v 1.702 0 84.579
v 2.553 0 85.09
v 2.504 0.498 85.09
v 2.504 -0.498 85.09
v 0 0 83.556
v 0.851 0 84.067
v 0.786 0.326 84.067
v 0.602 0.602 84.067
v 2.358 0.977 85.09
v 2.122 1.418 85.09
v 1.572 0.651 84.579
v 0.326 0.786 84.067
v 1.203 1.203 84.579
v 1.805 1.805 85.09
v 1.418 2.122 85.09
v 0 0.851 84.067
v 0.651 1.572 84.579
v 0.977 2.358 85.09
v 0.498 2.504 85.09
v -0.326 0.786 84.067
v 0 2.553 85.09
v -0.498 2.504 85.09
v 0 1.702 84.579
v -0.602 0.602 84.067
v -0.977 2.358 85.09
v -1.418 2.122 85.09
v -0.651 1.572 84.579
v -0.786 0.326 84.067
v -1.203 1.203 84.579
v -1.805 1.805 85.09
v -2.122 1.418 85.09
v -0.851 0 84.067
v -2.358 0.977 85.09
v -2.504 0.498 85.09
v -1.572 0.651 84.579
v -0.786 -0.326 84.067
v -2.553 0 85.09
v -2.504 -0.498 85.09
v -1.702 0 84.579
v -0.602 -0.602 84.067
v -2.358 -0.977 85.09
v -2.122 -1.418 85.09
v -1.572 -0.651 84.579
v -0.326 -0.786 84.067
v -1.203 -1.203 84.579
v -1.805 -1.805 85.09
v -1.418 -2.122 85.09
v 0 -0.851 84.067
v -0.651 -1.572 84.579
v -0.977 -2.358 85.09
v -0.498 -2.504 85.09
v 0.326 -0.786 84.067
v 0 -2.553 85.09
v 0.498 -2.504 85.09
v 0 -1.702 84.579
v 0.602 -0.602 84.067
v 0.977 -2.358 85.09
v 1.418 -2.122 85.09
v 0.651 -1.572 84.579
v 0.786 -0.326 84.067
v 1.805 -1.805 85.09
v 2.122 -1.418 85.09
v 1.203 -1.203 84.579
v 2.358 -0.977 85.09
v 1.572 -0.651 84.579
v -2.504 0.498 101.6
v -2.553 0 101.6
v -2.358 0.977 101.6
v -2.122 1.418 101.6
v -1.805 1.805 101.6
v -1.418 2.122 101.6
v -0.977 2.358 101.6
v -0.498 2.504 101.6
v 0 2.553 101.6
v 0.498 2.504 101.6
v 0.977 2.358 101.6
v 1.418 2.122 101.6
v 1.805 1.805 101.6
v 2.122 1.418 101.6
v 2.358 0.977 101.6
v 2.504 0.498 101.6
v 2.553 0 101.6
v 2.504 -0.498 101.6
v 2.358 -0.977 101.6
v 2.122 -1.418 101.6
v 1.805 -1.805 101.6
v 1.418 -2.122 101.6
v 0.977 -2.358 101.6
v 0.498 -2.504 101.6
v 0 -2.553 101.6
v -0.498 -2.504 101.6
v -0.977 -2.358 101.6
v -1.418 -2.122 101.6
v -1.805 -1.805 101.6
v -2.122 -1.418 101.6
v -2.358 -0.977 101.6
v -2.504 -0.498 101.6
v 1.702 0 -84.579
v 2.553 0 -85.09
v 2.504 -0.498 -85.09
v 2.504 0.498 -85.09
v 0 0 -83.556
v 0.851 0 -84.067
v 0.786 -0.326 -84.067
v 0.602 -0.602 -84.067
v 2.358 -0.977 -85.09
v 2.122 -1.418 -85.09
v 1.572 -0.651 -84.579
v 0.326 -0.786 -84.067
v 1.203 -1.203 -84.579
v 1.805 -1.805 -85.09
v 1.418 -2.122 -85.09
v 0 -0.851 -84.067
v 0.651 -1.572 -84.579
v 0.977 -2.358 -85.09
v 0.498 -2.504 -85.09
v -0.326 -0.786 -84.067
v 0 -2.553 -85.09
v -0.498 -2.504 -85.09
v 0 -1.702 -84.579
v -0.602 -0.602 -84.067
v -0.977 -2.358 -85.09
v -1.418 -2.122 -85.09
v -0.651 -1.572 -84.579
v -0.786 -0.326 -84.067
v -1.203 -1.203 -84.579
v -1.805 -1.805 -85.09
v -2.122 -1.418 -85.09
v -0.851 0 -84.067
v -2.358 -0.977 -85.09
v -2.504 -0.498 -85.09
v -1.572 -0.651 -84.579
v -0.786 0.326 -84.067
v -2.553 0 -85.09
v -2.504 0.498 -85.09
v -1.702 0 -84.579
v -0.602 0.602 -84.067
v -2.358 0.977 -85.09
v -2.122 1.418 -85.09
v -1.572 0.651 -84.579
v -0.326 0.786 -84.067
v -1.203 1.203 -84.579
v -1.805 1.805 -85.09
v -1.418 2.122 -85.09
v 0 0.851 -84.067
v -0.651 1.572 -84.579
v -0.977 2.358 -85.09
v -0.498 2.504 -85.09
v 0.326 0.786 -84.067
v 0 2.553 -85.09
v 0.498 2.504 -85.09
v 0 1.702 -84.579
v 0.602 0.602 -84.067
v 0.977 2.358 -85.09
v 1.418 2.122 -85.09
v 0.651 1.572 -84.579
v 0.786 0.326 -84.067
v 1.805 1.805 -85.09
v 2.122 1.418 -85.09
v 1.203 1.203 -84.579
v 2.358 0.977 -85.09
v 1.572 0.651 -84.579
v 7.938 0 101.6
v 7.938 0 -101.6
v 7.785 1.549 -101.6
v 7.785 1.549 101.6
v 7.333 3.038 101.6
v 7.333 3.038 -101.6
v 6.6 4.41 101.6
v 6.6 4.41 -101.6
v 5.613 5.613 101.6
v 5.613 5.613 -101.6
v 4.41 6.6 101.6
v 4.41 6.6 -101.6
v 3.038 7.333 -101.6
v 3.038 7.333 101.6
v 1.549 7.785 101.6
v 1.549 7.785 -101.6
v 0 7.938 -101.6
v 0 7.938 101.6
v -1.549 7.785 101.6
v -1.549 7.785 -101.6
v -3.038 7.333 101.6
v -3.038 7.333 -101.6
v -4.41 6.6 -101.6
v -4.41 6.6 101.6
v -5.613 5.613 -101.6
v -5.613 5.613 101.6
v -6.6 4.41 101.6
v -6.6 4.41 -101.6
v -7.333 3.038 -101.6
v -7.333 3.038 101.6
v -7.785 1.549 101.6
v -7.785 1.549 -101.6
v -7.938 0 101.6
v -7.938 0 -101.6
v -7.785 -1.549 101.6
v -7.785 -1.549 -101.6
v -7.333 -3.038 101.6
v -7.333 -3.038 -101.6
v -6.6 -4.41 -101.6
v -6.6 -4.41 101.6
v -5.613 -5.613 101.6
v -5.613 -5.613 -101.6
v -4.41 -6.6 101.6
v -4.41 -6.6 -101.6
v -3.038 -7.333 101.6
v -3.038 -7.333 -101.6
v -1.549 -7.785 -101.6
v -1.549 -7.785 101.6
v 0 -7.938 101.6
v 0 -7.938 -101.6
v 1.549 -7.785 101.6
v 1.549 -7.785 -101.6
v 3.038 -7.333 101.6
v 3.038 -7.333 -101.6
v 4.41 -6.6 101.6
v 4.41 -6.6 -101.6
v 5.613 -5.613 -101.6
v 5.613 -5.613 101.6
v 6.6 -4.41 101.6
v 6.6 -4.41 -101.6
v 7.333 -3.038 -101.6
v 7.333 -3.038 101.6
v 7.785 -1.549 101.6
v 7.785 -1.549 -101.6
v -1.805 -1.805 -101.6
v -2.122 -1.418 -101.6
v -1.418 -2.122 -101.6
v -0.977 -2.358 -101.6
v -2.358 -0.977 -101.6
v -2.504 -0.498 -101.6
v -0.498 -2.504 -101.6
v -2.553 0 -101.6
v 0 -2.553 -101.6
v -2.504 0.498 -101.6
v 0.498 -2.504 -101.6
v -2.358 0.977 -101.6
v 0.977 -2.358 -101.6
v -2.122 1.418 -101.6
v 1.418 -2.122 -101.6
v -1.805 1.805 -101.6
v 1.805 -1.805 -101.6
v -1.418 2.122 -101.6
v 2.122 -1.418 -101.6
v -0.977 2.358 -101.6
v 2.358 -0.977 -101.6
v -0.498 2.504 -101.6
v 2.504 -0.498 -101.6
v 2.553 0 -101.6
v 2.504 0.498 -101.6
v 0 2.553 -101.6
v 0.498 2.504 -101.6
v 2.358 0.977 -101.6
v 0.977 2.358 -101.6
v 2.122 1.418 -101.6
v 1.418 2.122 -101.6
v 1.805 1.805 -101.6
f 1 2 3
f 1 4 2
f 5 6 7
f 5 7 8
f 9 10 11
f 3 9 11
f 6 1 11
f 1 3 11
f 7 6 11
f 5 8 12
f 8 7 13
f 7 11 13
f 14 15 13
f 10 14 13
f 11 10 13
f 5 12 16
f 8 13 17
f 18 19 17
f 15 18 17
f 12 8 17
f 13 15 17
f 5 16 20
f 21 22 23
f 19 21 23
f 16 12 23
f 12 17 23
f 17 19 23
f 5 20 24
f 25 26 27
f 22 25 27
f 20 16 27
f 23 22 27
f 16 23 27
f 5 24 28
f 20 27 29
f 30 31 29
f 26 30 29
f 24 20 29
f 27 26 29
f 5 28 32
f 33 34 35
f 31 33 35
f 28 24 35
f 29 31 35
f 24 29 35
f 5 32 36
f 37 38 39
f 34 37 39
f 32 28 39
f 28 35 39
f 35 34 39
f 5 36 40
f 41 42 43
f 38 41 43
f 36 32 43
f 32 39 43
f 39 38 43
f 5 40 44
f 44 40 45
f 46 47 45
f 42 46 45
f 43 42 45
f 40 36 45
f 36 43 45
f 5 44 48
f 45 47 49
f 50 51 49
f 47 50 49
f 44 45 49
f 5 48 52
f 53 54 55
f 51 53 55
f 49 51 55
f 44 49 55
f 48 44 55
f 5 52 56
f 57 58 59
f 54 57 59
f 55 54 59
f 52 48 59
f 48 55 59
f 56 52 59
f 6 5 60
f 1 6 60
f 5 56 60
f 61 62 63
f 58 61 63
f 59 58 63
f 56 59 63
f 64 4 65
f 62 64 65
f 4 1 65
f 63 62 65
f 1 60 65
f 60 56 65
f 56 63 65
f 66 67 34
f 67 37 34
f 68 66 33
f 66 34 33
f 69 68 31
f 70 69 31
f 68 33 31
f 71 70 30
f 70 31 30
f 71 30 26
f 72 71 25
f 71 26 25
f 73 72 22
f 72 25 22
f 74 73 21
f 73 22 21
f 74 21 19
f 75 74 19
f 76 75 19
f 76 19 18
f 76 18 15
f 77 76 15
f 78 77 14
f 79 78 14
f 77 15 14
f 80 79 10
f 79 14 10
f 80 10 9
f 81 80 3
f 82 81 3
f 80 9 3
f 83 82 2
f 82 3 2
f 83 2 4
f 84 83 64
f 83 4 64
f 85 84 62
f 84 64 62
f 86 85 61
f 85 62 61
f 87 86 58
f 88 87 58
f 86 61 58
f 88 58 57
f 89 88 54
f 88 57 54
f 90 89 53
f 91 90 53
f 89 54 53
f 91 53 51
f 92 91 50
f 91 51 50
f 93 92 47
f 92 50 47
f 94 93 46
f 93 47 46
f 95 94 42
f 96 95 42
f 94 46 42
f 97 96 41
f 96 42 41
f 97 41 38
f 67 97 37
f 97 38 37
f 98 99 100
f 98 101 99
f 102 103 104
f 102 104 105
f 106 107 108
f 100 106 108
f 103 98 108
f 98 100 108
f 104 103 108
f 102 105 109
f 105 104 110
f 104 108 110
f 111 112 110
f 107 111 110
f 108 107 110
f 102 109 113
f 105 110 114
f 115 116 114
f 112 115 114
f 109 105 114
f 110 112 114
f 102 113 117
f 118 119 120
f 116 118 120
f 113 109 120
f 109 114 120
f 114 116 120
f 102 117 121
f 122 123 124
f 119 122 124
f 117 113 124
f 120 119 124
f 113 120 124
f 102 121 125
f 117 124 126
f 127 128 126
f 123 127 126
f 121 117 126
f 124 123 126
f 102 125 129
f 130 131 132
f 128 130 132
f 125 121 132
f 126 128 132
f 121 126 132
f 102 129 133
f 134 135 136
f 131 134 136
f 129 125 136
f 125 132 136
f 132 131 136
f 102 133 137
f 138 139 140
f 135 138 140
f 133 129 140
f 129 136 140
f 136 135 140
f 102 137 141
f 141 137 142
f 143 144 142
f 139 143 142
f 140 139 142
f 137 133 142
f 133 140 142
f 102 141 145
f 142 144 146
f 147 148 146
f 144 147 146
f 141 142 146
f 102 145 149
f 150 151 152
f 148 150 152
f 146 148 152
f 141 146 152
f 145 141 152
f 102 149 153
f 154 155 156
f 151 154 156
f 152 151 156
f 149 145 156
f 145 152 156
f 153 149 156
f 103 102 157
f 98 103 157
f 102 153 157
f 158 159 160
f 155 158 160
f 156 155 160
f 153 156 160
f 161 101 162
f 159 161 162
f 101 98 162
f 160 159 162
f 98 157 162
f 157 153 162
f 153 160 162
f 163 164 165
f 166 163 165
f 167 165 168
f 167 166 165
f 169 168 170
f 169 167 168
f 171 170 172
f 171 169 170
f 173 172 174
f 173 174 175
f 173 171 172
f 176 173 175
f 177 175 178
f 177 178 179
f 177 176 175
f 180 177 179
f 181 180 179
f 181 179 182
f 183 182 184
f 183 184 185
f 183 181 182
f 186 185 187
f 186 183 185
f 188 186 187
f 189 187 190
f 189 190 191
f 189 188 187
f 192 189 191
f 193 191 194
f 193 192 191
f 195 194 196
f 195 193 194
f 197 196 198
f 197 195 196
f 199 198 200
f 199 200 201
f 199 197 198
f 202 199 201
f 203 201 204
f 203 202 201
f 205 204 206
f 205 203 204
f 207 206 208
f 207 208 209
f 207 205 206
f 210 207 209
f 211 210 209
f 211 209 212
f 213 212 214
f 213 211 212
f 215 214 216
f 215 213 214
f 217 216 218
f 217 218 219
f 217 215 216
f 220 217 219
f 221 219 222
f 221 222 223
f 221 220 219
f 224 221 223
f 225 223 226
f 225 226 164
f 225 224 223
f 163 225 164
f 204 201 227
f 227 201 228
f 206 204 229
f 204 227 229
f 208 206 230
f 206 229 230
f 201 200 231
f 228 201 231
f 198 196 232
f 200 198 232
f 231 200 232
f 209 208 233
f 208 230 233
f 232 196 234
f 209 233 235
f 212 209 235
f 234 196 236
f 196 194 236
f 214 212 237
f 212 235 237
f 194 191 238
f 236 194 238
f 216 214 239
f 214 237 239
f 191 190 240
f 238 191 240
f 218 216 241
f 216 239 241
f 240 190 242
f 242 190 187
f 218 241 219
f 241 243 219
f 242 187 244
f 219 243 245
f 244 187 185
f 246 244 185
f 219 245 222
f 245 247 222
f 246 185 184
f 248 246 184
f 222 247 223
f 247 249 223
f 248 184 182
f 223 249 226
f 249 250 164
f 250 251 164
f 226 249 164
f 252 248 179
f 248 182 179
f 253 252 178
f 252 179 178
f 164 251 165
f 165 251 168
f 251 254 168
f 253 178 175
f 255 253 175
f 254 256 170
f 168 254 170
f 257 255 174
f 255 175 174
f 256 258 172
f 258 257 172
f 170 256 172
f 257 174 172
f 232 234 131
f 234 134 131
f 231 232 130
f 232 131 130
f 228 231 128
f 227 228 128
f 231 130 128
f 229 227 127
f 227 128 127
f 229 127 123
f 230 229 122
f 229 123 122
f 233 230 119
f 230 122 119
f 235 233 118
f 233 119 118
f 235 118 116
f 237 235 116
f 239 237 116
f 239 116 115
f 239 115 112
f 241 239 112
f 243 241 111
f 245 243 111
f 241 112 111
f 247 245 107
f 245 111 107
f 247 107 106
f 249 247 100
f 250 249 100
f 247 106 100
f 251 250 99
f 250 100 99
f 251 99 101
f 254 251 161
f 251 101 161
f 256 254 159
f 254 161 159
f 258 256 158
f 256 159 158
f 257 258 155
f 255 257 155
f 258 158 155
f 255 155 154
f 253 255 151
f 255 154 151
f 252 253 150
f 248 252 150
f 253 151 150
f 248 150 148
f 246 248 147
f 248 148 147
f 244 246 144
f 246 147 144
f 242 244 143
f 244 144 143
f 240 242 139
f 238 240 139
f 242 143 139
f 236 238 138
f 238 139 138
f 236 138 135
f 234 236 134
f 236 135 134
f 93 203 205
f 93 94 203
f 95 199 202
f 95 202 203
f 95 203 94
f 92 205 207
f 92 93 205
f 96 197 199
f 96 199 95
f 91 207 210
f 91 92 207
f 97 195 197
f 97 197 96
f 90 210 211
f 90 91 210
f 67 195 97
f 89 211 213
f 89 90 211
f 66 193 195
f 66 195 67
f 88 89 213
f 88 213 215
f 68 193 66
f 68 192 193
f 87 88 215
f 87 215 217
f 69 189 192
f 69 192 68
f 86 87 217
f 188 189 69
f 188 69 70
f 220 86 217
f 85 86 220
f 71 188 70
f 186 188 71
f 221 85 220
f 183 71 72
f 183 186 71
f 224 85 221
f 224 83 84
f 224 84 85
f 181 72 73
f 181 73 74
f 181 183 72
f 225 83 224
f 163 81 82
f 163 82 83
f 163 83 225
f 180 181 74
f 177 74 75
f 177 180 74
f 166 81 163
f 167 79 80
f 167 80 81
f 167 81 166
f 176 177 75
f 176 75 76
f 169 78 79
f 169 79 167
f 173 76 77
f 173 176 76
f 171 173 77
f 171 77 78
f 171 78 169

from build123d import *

# Parameters (mm, degrees)
F0_R     = 7.9375
F1_DEPTH = 101.6
F3_D     = 5.1054
F3_DEPTH = 16.51
F3_TIP   = 1.5338169022
F5_D     = 5.1054
F5_DEPTH = 16.51
F5_TIP   = 1.5338169022


with BuildPart() as f1:
    # F0 (on Top) → F1 (new body, symmetric)
    with BuildSketch(Plane.XY):
        Circle(F0_R)
    extrude(amount=F1_DEPTH, both=True)

    # F3
    with Locations(Plane.XY.offset(101.6)):
        with Locations((0, 0)):
            Hole(F3_D / 2, depth=F3_DEPTH)
            with Locations((0, 0, -(F3_DEPTH + F3_TIP / 2))):  # 118° drill point
                Cone(0, F3_D / 2, F3_TIP, mode=Mode.SUBTRACT)

    # F5
    with Locations(Plane(origin=(0, 0, -101.6), x_dir=(1, 0, 0), z_dir=(0, 0, -1))):
        with Locations((0, 0)):
            Hole(F5_D / 2, depth=F5_DEPTH)
            with Locations((0, 0, -(F5_DEPTH + F5_TIP / 2))):  # 118° drill point
                Cone(0, F5_D / 2, F5_TIP, mode=Mode.SUBTRACT)


solid = f1.part
